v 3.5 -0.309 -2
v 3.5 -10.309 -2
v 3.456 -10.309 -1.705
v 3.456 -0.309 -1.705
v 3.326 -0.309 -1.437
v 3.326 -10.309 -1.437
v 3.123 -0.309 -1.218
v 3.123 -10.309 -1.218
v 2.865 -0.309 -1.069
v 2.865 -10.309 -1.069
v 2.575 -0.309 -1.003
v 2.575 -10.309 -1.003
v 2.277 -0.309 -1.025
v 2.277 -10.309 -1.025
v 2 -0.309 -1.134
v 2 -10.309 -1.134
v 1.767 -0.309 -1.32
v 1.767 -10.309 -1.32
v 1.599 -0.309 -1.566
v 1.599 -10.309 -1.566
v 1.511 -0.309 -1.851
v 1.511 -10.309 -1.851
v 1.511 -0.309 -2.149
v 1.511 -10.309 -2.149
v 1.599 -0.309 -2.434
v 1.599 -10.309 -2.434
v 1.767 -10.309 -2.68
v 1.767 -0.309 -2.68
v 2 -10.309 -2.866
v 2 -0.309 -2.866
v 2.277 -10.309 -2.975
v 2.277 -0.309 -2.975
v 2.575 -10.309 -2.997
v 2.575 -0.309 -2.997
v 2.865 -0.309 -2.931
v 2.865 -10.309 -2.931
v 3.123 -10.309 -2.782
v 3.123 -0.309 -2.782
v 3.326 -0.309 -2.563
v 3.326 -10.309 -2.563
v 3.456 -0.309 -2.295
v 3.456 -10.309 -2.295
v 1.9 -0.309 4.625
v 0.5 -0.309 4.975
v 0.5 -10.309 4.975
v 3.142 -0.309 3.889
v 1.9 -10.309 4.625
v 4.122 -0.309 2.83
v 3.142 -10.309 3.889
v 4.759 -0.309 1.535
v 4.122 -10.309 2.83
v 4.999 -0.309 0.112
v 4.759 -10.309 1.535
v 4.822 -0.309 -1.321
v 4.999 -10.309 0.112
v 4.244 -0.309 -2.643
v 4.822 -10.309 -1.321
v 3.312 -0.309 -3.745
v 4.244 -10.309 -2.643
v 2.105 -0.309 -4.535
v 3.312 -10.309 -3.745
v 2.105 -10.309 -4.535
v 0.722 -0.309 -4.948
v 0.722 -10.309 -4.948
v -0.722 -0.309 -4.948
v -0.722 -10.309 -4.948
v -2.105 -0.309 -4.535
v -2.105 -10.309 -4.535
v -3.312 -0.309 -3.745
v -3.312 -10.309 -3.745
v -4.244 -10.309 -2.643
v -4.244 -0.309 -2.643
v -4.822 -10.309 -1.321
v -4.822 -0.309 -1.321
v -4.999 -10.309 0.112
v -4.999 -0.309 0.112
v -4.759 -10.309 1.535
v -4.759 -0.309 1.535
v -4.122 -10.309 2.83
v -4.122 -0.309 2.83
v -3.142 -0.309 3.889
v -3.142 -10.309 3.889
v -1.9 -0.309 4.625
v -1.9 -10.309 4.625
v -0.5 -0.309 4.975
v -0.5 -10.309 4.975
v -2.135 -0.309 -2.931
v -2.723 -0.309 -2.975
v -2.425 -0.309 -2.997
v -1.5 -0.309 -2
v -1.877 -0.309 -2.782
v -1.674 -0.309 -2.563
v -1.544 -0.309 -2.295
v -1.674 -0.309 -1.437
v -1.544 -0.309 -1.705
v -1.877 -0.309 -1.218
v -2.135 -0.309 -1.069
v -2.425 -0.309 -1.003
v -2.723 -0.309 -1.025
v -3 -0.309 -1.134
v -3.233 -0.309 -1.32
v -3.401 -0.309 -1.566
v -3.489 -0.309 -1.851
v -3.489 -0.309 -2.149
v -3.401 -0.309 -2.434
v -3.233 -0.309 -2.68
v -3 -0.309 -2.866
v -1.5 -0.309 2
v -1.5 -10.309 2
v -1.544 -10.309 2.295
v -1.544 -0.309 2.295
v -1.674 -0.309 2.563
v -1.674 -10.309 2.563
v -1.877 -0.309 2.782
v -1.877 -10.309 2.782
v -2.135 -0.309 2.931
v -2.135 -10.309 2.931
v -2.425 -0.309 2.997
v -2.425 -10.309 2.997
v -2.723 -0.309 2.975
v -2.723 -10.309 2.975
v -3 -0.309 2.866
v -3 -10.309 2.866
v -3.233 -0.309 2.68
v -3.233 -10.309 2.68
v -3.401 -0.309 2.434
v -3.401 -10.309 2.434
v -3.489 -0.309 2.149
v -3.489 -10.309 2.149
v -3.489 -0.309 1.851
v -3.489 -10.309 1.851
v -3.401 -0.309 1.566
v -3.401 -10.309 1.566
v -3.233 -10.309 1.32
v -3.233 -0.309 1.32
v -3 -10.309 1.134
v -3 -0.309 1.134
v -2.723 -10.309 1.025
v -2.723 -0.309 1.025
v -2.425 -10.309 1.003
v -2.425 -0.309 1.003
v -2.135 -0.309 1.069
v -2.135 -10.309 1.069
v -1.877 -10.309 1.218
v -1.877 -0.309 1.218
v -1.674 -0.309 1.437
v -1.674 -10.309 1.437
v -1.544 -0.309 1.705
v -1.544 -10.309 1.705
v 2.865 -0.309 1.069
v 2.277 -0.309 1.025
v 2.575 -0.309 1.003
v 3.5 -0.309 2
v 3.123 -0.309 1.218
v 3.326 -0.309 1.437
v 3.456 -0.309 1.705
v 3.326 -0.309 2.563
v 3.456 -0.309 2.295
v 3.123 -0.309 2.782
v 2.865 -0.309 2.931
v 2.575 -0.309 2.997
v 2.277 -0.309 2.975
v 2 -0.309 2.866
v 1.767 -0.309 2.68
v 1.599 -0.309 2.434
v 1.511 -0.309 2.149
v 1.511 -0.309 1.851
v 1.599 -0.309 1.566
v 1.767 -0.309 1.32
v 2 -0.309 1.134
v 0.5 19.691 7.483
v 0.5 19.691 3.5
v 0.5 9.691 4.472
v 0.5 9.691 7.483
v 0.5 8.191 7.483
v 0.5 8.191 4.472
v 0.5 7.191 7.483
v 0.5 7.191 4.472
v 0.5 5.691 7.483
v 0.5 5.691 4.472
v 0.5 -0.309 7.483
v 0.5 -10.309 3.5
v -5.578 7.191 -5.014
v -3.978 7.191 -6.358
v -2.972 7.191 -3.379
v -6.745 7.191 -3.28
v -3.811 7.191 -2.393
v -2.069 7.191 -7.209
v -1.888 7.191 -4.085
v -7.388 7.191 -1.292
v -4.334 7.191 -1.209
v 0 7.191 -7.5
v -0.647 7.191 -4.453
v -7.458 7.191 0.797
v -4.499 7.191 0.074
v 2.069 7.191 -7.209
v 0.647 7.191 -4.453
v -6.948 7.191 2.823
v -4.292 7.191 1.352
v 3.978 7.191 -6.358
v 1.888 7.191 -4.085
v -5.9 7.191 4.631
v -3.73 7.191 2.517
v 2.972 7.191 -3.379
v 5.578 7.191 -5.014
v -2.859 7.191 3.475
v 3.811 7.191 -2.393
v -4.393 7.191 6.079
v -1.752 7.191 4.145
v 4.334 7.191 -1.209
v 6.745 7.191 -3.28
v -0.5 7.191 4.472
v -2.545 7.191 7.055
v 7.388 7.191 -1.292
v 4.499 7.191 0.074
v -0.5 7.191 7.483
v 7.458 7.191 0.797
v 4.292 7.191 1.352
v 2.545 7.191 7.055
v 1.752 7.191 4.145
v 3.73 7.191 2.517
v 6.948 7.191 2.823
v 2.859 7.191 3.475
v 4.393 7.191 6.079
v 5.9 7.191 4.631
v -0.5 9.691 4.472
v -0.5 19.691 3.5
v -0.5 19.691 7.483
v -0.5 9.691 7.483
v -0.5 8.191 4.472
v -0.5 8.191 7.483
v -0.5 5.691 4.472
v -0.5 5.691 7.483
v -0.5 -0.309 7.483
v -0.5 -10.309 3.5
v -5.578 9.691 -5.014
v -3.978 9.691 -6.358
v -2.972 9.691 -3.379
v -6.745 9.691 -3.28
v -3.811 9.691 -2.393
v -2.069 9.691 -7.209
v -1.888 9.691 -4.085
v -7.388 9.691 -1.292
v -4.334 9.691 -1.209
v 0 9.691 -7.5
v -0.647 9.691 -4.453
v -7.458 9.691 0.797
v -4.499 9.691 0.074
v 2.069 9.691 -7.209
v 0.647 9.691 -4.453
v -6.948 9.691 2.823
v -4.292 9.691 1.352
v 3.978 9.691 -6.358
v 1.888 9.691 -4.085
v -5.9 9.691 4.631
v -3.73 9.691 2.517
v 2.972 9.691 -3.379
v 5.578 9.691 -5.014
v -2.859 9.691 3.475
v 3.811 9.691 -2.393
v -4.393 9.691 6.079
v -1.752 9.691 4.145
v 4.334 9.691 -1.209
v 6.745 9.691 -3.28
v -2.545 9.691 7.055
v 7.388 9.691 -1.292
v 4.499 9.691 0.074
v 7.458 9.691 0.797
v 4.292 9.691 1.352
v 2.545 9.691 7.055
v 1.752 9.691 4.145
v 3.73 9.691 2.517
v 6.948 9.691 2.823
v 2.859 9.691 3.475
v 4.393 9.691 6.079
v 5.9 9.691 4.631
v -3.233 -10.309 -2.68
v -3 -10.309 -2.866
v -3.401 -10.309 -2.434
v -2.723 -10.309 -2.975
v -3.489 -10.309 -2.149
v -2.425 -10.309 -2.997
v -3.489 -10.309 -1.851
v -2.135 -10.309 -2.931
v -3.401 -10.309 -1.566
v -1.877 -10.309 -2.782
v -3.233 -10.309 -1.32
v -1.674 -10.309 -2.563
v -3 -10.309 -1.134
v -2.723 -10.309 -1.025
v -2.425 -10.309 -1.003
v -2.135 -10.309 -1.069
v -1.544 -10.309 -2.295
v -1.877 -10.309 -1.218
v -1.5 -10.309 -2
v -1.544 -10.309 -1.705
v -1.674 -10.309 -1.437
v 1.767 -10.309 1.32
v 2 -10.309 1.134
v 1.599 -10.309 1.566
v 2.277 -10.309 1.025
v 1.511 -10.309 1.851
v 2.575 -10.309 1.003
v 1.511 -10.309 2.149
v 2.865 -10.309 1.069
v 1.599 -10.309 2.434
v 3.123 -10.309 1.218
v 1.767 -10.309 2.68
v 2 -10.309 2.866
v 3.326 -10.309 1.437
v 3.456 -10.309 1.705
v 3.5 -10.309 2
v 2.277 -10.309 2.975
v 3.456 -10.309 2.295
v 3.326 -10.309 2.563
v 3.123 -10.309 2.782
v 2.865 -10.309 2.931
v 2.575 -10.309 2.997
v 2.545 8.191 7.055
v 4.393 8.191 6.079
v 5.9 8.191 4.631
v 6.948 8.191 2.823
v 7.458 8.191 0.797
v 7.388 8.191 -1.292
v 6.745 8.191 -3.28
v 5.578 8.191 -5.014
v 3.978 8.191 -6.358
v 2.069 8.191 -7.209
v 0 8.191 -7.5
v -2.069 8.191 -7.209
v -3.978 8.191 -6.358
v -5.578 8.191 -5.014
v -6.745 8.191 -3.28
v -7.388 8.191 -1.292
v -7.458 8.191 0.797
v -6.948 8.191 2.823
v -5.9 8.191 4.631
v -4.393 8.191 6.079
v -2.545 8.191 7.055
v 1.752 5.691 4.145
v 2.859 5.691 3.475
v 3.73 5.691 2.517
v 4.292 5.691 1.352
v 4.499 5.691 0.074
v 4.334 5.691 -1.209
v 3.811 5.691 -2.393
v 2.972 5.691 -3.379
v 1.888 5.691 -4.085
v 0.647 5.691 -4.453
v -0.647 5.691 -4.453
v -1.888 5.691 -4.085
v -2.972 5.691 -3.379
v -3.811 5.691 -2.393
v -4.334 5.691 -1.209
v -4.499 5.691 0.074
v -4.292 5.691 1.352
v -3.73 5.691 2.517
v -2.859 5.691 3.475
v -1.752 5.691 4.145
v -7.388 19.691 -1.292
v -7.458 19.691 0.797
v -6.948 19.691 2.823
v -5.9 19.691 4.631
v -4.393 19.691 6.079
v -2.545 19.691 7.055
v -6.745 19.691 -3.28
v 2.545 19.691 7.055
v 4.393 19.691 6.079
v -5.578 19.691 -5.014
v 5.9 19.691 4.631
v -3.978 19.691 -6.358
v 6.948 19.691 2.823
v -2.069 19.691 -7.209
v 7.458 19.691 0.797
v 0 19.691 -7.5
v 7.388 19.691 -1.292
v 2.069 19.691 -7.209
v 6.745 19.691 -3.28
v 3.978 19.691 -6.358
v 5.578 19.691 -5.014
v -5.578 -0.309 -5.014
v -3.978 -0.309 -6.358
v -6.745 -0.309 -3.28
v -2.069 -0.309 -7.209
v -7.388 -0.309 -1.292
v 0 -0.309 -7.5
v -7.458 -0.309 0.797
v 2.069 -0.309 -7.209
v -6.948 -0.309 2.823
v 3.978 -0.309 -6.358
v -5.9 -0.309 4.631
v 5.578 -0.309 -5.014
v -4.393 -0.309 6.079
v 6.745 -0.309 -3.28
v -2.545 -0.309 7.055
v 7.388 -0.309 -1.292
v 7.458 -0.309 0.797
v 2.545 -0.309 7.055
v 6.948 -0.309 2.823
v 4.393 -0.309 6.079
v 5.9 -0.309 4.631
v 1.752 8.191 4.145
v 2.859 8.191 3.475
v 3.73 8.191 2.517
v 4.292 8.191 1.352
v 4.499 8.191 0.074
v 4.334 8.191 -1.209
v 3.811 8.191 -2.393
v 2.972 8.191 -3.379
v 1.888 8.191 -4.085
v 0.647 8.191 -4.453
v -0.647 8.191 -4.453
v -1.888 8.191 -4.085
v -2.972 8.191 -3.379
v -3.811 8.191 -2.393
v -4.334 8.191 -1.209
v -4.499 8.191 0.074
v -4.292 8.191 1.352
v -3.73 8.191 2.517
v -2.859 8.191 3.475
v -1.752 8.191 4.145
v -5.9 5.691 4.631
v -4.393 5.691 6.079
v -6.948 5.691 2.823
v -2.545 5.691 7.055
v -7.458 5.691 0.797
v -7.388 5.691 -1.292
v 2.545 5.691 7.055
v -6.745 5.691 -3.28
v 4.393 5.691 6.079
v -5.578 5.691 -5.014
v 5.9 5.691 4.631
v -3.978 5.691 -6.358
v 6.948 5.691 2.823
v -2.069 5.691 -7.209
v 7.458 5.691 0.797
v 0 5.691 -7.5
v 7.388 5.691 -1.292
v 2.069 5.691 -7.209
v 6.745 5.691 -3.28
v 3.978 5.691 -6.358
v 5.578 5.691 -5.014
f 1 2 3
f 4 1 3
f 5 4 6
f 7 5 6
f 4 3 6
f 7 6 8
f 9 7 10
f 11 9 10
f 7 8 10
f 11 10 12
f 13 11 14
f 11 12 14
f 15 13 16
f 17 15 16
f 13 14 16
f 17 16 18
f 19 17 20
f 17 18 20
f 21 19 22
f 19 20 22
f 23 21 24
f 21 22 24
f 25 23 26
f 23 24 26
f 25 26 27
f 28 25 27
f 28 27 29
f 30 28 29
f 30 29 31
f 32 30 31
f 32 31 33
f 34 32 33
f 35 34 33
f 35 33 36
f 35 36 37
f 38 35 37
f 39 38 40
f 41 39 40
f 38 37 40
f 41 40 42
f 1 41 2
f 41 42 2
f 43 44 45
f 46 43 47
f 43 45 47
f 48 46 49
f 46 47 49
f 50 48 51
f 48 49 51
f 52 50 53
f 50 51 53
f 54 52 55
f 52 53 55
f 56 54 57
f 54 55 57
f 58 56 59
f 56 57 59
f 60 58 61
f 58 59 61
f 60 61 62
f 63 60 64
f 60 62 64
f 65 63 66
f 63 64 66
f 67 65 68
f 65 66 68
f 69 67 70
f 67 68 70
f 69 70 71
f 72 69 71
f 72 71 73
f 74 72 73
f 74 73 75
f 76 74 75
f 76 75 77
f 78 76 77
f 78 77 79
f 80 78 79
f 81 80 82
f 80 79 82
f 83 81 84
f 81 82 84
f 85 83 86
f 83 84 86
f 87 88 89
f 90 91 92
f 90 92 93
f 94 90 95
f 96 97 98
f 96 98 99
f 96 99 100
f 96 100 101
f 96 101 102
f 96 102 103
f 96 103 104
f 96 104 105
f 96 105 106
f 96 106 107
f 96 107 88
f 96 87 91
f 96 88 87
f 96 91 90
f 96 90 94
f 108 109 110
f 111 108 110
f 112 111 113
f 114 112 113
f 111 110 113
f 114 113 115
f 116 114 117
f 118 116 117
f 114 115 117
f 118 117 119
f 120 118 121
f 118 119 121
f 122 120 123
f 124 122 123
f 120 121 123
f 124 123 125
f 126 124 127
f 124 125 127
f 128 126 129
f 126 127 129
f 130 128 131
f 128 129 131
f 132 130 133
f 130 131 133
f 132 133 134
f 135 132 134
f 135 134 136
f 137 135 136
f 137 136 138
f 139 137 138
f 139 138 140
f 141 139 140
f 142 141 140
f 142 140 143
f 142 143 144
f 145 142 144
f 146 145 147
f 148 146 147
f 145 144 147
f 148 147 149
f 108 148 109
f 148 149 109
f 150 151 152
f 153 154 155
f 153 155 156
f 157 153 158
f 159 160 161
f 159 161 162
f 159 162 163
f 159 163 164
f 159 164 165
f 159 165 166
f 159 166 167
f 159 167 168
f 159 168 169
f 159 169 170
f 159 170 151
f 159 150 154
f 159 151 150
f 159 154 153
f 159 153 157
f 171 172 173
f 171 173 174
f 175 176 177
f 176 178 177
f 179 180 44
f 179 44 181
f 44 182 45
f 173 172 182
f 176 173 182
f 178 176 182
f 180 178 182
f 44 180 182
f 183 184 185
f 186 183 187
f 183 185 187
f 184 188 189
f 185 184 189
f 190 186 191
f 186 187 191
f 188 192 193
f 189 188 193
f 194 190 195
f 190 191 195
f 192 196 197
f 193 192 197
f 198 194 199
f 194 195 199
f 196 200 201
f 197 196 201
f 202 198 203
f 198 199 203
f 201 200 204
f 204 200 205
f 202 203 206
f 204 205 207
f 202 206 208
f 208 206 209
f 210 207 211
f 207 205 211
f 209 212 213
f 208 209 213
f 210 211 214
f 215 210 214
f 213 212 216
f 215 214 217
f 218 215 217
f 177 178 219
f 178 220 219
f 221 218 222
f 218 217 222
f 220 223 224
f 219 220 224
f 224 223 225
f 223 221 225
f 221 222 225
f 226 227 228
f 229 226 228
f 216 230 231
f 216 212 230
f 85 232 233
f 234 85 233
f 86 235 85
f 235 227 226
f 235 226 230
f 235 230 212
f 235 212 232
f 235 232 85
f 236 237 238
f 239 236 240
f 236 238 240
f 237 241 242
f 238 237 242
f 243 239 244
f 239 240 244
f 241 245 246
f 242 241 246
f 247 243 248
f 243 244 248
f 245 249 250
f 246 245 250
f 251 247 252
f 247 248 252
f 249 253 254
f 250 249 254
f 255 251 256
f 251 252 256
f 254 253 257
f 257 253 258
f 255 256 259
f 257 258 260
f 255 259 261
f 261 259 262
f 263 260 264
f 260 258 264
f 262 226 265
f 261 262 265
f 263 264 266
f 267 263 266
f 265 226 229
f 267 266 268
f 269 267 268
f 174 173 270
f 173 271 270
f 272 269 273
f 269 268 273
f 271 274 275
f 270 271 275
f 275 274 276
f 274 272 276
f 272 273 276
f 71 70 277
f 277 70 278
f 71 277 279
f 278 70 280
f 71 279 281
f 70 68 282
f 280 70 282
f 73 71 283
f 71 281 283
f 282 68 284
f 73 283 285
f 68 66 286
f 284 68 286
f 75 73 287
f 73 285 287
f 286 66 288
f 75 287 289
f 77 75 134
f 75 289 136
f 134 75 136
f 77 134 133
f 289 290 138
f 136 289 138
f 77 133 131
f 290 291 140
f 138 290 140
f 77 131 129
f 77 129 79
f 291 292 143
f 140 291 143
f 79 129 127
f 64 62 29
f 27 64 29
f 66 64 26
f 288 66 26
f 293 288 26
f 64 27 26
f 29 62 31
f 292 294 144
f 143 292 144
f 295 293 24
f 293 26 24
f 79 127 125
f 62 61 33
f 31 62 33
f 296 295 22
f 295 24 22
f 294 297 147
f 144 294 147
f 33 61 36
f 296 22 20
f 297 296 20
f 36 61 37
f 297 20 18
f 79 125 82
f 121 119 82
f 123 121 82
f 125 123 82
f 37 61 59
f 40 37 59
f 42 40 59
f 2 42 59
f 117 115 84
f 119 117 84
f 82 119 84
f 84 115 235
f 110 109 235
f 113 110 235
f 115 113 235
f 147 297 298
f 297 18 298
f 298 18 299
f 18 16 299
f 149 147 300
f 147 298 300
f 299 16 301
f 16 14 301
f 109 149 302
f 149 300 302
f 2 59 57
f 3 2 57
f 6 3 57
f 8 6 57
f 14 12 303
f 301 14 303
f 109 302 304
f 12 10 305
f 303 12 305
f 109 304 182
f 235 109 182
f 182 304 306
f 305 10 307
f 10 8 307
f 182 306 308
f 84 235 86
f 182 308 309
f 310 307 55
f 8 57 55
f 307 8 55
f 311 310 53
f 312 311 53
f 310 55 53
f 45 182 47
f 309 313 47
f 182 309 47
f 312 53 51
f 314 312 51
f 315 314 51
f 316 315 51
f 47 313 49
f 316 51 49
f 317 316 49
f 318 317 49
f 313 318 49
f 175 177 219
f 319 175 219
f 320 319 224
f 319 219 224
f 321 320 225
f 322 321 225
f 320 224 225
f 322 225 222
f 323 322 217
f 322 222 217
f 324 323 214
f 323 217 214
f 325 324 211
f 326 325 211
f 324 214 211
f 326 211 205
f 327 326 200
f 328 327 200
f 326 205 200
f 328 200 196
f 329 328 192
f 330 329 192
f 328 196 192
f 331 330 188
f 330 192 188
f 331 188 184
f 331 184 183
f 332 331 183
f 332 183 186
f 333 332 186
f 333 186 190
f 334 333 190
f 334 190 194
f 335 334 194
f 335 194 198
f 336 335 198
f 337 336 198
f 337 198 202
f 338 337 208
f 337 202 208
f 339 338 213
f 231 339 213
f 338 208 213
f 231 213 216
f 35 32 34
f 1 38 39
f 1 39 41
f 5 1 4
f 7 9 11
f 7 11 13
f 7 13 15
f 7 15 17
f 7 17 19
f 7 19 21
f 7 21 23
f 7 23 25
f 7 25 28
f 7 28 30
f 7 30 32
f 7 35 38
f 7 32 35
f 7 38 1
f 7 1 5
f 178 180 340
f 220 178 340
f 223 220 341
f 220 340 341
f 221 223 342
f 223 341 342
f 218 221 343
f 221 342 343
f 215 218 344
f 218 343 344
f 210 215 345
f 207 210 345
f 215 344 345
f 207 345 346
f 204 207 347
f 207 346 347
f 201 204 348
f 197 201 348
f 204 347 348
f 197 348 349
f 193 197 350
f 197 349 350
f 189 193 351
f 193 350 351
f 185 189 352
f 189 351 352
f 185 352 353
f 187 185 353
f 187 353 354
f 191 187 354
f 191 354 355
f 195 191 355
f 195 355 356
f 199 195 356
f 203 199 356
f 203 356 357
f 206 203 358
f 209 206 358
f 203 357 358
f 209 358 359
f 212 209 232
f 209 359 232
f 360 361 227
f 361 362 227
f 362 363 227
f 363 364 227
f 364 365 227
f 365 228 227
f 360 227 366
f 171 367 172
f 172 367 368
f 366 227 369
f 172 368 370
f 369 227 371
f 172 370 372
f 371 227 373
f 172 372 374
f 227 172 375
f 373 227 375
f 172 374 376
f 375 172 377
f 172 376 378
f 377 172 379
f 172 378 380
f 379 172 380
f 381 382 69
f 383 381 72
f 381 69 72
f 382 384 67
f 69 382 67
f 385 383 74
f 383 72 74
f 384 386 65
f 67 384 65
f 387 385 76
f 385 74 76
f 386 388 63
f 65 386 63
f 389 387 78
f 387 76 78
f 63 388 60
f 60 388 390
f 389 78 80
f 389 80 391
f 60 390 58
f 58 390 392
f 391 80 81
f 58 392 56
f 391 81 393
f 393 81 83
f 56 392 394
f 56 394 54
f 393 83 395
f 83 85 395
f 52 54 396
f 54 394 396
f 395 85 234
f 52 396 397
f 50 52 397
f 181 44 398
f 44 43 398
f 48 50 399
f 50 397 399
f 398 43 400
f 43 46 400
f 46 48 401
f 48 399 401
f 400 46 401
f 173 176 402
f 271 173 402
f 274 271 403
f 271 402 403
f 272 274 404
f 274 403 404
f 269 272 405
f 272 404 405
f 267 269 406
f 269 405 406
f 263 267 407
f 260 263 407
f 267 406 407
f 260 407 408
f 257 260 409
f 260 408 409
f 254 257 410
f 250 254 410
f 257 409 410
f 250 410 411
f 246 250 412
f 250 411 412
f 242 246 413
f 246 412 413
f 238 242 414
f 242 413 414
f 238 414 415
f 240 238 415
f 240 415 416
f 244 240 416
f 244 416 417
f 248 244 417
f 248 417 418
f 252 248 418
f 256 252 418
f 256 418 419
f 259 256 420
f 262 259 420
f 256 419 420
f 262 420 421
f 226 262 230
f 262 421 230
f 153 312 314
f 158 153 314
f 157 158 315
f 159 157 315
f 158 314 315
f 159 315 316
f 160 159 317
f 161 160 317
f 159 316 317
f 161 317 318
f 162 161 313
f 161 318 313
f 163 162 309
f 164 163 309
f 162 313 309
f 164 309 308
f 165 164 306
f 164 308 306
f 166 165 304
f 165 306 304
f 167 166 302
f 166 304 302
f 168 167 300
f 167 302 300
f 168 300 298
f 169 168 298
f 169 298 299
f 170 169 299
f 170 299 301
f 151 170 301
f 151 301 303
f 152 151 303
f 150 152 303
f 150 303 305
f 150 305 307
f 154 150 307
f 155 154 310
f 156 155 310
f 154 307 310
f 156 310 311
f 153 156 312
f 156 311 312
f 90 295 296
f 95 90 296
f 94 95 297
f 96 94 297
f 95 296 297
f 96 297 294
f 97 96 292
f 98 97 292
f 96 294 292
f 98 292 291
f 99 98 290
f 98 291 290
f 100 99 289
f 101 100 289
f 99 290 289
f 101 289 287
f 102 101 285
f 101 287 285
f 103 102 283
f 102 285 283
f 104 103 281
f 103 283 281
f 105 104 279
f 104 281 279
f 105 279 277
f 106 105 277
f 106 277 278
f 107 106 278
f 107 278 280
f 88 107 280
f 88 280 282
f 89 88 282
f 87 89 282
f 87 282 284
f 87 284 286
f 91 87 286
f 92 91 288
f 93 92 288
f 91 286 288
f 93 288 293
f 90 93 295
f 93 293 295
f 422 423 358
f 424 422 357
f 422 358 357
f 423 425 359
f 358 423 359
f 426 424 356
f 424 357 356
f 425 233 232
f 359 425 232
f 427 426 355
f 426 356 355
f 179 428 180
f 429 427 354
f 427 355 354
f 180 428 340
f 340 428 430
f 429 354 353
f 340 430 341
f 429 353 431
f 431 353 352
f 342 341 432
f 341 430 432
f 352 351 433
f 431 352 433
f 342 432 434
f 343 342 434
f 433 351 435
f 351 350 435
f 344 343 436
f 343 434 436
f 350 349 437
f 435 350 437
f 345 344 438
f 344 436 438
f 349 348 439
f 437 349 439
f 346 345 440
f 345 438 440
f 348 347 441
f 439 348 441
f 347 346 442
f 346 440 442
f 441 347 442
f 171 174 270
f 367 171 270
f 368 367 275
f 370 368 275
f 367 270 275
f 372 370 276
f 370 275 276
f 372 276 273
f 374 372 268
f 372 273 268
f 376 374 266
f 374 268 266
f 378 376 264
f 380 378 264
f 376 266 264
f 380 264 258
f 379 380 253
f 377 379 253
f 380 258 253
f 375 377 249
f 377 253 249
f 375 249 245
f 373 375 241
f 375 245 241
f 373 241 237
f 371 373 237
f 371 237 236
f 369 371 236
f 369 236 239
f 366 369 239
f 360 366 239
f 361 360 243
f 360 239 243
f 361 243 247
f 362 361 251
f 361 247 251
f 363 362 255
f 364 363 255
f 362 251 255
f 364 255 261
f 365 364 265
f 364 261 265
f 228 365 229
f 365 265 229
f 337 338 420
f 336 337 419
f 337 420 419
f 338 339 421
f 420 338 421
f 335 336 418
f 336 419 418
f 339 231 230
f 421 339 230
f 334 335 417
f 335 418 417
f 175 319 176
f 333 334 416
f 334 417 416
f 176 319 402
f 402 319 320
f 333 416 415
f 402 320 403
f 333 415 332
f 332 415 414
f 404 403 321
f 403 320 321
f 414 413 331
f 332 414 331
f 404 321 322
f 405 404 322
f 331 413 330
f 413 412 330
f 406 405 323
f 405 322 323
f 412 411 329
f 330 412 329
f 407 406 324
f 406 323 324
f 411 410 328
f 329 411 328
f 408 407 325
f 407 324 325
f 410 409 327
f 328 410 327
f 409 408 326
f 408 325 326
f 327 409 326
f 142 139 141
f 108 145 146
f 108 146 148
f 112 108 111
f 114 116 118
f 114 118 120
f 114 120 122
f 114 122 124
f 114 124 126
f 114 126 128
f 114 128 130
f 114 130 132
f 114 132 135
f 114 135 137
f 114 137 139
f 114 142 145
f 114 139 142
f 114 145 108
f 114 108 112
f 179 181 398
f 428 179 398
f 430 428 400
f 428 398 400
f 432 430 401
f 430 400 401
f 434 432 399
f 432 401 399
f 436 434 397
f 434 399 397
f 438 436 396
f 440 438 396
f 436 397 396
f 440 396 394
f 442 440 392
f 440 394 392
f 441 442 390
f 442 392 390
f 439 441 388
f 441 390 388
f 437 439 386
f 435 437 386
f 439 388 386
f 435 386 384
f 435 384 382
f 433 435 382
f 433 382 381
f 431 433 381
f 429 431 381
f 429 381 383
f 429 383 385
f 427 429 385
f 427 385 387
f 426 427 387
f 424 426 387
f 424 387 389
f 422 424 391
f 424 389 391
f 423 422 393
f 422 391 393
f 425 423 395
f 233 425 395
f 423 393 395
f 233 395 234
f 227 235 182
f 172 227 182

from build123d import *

# Parameters (mm, degrees)
F2_R     = 1
F3_DEPTH = 10
F4_W     = 0.5
F4_H     = 4
F5_DEPTH = 30.001


with BuildPart() as f1:
    # F0 (on Right) → F1 (revolve)
    with BuildSketch(Plane.YZ):
        Polygon((5.690518, 7.5), (-0.309482, 7.5), (-0.309482, 5), (-10.309482, 5), (-10.309482, 0), (19.690518, 0), (19.690518, 7.5), (9.690518, 7.5), (9.690518, 4.5), (8.190518, 4.5), (8.190518, 7.5), (7.190518, 7.5), (7.190518, 4.5), (5.690518, 4.5), align=None)
    revolve(axis=Axis((0, 12.775562, 0), (0, 1, 0)))

    # F2 (on face) → F3 (cut)
    with BuildSketch(Plane.XZ.offset(10.309482)):
        with Locations((-2.5, 2)):
            Circle(F2_R)
        with Locations((2.5, 2)):
            Circle(F2_R)
        with Locations((-2.5, -2)):
            Circle(F2_R)
        with Locations((2.5, -2)):
            Circle(F2_R)
    extrude(amount=-F3_DEPTH, mode=Mode.SUBTRACT)

    # F4 (on face) → F5 (cut, through all)
    with BuildSketch(Plane.XZ.offset(10.309482)):
        with Locations((-0.25, 5.5)):
            Rectangle(F4_W, F4_H)
        with Locations((0.25, 5.5)):
            Rectangle(F4_W, F4_H)
    extrude(amount=-F5_DEPTH, mode=Mode.SUBTRACT)


solid = f1.part
